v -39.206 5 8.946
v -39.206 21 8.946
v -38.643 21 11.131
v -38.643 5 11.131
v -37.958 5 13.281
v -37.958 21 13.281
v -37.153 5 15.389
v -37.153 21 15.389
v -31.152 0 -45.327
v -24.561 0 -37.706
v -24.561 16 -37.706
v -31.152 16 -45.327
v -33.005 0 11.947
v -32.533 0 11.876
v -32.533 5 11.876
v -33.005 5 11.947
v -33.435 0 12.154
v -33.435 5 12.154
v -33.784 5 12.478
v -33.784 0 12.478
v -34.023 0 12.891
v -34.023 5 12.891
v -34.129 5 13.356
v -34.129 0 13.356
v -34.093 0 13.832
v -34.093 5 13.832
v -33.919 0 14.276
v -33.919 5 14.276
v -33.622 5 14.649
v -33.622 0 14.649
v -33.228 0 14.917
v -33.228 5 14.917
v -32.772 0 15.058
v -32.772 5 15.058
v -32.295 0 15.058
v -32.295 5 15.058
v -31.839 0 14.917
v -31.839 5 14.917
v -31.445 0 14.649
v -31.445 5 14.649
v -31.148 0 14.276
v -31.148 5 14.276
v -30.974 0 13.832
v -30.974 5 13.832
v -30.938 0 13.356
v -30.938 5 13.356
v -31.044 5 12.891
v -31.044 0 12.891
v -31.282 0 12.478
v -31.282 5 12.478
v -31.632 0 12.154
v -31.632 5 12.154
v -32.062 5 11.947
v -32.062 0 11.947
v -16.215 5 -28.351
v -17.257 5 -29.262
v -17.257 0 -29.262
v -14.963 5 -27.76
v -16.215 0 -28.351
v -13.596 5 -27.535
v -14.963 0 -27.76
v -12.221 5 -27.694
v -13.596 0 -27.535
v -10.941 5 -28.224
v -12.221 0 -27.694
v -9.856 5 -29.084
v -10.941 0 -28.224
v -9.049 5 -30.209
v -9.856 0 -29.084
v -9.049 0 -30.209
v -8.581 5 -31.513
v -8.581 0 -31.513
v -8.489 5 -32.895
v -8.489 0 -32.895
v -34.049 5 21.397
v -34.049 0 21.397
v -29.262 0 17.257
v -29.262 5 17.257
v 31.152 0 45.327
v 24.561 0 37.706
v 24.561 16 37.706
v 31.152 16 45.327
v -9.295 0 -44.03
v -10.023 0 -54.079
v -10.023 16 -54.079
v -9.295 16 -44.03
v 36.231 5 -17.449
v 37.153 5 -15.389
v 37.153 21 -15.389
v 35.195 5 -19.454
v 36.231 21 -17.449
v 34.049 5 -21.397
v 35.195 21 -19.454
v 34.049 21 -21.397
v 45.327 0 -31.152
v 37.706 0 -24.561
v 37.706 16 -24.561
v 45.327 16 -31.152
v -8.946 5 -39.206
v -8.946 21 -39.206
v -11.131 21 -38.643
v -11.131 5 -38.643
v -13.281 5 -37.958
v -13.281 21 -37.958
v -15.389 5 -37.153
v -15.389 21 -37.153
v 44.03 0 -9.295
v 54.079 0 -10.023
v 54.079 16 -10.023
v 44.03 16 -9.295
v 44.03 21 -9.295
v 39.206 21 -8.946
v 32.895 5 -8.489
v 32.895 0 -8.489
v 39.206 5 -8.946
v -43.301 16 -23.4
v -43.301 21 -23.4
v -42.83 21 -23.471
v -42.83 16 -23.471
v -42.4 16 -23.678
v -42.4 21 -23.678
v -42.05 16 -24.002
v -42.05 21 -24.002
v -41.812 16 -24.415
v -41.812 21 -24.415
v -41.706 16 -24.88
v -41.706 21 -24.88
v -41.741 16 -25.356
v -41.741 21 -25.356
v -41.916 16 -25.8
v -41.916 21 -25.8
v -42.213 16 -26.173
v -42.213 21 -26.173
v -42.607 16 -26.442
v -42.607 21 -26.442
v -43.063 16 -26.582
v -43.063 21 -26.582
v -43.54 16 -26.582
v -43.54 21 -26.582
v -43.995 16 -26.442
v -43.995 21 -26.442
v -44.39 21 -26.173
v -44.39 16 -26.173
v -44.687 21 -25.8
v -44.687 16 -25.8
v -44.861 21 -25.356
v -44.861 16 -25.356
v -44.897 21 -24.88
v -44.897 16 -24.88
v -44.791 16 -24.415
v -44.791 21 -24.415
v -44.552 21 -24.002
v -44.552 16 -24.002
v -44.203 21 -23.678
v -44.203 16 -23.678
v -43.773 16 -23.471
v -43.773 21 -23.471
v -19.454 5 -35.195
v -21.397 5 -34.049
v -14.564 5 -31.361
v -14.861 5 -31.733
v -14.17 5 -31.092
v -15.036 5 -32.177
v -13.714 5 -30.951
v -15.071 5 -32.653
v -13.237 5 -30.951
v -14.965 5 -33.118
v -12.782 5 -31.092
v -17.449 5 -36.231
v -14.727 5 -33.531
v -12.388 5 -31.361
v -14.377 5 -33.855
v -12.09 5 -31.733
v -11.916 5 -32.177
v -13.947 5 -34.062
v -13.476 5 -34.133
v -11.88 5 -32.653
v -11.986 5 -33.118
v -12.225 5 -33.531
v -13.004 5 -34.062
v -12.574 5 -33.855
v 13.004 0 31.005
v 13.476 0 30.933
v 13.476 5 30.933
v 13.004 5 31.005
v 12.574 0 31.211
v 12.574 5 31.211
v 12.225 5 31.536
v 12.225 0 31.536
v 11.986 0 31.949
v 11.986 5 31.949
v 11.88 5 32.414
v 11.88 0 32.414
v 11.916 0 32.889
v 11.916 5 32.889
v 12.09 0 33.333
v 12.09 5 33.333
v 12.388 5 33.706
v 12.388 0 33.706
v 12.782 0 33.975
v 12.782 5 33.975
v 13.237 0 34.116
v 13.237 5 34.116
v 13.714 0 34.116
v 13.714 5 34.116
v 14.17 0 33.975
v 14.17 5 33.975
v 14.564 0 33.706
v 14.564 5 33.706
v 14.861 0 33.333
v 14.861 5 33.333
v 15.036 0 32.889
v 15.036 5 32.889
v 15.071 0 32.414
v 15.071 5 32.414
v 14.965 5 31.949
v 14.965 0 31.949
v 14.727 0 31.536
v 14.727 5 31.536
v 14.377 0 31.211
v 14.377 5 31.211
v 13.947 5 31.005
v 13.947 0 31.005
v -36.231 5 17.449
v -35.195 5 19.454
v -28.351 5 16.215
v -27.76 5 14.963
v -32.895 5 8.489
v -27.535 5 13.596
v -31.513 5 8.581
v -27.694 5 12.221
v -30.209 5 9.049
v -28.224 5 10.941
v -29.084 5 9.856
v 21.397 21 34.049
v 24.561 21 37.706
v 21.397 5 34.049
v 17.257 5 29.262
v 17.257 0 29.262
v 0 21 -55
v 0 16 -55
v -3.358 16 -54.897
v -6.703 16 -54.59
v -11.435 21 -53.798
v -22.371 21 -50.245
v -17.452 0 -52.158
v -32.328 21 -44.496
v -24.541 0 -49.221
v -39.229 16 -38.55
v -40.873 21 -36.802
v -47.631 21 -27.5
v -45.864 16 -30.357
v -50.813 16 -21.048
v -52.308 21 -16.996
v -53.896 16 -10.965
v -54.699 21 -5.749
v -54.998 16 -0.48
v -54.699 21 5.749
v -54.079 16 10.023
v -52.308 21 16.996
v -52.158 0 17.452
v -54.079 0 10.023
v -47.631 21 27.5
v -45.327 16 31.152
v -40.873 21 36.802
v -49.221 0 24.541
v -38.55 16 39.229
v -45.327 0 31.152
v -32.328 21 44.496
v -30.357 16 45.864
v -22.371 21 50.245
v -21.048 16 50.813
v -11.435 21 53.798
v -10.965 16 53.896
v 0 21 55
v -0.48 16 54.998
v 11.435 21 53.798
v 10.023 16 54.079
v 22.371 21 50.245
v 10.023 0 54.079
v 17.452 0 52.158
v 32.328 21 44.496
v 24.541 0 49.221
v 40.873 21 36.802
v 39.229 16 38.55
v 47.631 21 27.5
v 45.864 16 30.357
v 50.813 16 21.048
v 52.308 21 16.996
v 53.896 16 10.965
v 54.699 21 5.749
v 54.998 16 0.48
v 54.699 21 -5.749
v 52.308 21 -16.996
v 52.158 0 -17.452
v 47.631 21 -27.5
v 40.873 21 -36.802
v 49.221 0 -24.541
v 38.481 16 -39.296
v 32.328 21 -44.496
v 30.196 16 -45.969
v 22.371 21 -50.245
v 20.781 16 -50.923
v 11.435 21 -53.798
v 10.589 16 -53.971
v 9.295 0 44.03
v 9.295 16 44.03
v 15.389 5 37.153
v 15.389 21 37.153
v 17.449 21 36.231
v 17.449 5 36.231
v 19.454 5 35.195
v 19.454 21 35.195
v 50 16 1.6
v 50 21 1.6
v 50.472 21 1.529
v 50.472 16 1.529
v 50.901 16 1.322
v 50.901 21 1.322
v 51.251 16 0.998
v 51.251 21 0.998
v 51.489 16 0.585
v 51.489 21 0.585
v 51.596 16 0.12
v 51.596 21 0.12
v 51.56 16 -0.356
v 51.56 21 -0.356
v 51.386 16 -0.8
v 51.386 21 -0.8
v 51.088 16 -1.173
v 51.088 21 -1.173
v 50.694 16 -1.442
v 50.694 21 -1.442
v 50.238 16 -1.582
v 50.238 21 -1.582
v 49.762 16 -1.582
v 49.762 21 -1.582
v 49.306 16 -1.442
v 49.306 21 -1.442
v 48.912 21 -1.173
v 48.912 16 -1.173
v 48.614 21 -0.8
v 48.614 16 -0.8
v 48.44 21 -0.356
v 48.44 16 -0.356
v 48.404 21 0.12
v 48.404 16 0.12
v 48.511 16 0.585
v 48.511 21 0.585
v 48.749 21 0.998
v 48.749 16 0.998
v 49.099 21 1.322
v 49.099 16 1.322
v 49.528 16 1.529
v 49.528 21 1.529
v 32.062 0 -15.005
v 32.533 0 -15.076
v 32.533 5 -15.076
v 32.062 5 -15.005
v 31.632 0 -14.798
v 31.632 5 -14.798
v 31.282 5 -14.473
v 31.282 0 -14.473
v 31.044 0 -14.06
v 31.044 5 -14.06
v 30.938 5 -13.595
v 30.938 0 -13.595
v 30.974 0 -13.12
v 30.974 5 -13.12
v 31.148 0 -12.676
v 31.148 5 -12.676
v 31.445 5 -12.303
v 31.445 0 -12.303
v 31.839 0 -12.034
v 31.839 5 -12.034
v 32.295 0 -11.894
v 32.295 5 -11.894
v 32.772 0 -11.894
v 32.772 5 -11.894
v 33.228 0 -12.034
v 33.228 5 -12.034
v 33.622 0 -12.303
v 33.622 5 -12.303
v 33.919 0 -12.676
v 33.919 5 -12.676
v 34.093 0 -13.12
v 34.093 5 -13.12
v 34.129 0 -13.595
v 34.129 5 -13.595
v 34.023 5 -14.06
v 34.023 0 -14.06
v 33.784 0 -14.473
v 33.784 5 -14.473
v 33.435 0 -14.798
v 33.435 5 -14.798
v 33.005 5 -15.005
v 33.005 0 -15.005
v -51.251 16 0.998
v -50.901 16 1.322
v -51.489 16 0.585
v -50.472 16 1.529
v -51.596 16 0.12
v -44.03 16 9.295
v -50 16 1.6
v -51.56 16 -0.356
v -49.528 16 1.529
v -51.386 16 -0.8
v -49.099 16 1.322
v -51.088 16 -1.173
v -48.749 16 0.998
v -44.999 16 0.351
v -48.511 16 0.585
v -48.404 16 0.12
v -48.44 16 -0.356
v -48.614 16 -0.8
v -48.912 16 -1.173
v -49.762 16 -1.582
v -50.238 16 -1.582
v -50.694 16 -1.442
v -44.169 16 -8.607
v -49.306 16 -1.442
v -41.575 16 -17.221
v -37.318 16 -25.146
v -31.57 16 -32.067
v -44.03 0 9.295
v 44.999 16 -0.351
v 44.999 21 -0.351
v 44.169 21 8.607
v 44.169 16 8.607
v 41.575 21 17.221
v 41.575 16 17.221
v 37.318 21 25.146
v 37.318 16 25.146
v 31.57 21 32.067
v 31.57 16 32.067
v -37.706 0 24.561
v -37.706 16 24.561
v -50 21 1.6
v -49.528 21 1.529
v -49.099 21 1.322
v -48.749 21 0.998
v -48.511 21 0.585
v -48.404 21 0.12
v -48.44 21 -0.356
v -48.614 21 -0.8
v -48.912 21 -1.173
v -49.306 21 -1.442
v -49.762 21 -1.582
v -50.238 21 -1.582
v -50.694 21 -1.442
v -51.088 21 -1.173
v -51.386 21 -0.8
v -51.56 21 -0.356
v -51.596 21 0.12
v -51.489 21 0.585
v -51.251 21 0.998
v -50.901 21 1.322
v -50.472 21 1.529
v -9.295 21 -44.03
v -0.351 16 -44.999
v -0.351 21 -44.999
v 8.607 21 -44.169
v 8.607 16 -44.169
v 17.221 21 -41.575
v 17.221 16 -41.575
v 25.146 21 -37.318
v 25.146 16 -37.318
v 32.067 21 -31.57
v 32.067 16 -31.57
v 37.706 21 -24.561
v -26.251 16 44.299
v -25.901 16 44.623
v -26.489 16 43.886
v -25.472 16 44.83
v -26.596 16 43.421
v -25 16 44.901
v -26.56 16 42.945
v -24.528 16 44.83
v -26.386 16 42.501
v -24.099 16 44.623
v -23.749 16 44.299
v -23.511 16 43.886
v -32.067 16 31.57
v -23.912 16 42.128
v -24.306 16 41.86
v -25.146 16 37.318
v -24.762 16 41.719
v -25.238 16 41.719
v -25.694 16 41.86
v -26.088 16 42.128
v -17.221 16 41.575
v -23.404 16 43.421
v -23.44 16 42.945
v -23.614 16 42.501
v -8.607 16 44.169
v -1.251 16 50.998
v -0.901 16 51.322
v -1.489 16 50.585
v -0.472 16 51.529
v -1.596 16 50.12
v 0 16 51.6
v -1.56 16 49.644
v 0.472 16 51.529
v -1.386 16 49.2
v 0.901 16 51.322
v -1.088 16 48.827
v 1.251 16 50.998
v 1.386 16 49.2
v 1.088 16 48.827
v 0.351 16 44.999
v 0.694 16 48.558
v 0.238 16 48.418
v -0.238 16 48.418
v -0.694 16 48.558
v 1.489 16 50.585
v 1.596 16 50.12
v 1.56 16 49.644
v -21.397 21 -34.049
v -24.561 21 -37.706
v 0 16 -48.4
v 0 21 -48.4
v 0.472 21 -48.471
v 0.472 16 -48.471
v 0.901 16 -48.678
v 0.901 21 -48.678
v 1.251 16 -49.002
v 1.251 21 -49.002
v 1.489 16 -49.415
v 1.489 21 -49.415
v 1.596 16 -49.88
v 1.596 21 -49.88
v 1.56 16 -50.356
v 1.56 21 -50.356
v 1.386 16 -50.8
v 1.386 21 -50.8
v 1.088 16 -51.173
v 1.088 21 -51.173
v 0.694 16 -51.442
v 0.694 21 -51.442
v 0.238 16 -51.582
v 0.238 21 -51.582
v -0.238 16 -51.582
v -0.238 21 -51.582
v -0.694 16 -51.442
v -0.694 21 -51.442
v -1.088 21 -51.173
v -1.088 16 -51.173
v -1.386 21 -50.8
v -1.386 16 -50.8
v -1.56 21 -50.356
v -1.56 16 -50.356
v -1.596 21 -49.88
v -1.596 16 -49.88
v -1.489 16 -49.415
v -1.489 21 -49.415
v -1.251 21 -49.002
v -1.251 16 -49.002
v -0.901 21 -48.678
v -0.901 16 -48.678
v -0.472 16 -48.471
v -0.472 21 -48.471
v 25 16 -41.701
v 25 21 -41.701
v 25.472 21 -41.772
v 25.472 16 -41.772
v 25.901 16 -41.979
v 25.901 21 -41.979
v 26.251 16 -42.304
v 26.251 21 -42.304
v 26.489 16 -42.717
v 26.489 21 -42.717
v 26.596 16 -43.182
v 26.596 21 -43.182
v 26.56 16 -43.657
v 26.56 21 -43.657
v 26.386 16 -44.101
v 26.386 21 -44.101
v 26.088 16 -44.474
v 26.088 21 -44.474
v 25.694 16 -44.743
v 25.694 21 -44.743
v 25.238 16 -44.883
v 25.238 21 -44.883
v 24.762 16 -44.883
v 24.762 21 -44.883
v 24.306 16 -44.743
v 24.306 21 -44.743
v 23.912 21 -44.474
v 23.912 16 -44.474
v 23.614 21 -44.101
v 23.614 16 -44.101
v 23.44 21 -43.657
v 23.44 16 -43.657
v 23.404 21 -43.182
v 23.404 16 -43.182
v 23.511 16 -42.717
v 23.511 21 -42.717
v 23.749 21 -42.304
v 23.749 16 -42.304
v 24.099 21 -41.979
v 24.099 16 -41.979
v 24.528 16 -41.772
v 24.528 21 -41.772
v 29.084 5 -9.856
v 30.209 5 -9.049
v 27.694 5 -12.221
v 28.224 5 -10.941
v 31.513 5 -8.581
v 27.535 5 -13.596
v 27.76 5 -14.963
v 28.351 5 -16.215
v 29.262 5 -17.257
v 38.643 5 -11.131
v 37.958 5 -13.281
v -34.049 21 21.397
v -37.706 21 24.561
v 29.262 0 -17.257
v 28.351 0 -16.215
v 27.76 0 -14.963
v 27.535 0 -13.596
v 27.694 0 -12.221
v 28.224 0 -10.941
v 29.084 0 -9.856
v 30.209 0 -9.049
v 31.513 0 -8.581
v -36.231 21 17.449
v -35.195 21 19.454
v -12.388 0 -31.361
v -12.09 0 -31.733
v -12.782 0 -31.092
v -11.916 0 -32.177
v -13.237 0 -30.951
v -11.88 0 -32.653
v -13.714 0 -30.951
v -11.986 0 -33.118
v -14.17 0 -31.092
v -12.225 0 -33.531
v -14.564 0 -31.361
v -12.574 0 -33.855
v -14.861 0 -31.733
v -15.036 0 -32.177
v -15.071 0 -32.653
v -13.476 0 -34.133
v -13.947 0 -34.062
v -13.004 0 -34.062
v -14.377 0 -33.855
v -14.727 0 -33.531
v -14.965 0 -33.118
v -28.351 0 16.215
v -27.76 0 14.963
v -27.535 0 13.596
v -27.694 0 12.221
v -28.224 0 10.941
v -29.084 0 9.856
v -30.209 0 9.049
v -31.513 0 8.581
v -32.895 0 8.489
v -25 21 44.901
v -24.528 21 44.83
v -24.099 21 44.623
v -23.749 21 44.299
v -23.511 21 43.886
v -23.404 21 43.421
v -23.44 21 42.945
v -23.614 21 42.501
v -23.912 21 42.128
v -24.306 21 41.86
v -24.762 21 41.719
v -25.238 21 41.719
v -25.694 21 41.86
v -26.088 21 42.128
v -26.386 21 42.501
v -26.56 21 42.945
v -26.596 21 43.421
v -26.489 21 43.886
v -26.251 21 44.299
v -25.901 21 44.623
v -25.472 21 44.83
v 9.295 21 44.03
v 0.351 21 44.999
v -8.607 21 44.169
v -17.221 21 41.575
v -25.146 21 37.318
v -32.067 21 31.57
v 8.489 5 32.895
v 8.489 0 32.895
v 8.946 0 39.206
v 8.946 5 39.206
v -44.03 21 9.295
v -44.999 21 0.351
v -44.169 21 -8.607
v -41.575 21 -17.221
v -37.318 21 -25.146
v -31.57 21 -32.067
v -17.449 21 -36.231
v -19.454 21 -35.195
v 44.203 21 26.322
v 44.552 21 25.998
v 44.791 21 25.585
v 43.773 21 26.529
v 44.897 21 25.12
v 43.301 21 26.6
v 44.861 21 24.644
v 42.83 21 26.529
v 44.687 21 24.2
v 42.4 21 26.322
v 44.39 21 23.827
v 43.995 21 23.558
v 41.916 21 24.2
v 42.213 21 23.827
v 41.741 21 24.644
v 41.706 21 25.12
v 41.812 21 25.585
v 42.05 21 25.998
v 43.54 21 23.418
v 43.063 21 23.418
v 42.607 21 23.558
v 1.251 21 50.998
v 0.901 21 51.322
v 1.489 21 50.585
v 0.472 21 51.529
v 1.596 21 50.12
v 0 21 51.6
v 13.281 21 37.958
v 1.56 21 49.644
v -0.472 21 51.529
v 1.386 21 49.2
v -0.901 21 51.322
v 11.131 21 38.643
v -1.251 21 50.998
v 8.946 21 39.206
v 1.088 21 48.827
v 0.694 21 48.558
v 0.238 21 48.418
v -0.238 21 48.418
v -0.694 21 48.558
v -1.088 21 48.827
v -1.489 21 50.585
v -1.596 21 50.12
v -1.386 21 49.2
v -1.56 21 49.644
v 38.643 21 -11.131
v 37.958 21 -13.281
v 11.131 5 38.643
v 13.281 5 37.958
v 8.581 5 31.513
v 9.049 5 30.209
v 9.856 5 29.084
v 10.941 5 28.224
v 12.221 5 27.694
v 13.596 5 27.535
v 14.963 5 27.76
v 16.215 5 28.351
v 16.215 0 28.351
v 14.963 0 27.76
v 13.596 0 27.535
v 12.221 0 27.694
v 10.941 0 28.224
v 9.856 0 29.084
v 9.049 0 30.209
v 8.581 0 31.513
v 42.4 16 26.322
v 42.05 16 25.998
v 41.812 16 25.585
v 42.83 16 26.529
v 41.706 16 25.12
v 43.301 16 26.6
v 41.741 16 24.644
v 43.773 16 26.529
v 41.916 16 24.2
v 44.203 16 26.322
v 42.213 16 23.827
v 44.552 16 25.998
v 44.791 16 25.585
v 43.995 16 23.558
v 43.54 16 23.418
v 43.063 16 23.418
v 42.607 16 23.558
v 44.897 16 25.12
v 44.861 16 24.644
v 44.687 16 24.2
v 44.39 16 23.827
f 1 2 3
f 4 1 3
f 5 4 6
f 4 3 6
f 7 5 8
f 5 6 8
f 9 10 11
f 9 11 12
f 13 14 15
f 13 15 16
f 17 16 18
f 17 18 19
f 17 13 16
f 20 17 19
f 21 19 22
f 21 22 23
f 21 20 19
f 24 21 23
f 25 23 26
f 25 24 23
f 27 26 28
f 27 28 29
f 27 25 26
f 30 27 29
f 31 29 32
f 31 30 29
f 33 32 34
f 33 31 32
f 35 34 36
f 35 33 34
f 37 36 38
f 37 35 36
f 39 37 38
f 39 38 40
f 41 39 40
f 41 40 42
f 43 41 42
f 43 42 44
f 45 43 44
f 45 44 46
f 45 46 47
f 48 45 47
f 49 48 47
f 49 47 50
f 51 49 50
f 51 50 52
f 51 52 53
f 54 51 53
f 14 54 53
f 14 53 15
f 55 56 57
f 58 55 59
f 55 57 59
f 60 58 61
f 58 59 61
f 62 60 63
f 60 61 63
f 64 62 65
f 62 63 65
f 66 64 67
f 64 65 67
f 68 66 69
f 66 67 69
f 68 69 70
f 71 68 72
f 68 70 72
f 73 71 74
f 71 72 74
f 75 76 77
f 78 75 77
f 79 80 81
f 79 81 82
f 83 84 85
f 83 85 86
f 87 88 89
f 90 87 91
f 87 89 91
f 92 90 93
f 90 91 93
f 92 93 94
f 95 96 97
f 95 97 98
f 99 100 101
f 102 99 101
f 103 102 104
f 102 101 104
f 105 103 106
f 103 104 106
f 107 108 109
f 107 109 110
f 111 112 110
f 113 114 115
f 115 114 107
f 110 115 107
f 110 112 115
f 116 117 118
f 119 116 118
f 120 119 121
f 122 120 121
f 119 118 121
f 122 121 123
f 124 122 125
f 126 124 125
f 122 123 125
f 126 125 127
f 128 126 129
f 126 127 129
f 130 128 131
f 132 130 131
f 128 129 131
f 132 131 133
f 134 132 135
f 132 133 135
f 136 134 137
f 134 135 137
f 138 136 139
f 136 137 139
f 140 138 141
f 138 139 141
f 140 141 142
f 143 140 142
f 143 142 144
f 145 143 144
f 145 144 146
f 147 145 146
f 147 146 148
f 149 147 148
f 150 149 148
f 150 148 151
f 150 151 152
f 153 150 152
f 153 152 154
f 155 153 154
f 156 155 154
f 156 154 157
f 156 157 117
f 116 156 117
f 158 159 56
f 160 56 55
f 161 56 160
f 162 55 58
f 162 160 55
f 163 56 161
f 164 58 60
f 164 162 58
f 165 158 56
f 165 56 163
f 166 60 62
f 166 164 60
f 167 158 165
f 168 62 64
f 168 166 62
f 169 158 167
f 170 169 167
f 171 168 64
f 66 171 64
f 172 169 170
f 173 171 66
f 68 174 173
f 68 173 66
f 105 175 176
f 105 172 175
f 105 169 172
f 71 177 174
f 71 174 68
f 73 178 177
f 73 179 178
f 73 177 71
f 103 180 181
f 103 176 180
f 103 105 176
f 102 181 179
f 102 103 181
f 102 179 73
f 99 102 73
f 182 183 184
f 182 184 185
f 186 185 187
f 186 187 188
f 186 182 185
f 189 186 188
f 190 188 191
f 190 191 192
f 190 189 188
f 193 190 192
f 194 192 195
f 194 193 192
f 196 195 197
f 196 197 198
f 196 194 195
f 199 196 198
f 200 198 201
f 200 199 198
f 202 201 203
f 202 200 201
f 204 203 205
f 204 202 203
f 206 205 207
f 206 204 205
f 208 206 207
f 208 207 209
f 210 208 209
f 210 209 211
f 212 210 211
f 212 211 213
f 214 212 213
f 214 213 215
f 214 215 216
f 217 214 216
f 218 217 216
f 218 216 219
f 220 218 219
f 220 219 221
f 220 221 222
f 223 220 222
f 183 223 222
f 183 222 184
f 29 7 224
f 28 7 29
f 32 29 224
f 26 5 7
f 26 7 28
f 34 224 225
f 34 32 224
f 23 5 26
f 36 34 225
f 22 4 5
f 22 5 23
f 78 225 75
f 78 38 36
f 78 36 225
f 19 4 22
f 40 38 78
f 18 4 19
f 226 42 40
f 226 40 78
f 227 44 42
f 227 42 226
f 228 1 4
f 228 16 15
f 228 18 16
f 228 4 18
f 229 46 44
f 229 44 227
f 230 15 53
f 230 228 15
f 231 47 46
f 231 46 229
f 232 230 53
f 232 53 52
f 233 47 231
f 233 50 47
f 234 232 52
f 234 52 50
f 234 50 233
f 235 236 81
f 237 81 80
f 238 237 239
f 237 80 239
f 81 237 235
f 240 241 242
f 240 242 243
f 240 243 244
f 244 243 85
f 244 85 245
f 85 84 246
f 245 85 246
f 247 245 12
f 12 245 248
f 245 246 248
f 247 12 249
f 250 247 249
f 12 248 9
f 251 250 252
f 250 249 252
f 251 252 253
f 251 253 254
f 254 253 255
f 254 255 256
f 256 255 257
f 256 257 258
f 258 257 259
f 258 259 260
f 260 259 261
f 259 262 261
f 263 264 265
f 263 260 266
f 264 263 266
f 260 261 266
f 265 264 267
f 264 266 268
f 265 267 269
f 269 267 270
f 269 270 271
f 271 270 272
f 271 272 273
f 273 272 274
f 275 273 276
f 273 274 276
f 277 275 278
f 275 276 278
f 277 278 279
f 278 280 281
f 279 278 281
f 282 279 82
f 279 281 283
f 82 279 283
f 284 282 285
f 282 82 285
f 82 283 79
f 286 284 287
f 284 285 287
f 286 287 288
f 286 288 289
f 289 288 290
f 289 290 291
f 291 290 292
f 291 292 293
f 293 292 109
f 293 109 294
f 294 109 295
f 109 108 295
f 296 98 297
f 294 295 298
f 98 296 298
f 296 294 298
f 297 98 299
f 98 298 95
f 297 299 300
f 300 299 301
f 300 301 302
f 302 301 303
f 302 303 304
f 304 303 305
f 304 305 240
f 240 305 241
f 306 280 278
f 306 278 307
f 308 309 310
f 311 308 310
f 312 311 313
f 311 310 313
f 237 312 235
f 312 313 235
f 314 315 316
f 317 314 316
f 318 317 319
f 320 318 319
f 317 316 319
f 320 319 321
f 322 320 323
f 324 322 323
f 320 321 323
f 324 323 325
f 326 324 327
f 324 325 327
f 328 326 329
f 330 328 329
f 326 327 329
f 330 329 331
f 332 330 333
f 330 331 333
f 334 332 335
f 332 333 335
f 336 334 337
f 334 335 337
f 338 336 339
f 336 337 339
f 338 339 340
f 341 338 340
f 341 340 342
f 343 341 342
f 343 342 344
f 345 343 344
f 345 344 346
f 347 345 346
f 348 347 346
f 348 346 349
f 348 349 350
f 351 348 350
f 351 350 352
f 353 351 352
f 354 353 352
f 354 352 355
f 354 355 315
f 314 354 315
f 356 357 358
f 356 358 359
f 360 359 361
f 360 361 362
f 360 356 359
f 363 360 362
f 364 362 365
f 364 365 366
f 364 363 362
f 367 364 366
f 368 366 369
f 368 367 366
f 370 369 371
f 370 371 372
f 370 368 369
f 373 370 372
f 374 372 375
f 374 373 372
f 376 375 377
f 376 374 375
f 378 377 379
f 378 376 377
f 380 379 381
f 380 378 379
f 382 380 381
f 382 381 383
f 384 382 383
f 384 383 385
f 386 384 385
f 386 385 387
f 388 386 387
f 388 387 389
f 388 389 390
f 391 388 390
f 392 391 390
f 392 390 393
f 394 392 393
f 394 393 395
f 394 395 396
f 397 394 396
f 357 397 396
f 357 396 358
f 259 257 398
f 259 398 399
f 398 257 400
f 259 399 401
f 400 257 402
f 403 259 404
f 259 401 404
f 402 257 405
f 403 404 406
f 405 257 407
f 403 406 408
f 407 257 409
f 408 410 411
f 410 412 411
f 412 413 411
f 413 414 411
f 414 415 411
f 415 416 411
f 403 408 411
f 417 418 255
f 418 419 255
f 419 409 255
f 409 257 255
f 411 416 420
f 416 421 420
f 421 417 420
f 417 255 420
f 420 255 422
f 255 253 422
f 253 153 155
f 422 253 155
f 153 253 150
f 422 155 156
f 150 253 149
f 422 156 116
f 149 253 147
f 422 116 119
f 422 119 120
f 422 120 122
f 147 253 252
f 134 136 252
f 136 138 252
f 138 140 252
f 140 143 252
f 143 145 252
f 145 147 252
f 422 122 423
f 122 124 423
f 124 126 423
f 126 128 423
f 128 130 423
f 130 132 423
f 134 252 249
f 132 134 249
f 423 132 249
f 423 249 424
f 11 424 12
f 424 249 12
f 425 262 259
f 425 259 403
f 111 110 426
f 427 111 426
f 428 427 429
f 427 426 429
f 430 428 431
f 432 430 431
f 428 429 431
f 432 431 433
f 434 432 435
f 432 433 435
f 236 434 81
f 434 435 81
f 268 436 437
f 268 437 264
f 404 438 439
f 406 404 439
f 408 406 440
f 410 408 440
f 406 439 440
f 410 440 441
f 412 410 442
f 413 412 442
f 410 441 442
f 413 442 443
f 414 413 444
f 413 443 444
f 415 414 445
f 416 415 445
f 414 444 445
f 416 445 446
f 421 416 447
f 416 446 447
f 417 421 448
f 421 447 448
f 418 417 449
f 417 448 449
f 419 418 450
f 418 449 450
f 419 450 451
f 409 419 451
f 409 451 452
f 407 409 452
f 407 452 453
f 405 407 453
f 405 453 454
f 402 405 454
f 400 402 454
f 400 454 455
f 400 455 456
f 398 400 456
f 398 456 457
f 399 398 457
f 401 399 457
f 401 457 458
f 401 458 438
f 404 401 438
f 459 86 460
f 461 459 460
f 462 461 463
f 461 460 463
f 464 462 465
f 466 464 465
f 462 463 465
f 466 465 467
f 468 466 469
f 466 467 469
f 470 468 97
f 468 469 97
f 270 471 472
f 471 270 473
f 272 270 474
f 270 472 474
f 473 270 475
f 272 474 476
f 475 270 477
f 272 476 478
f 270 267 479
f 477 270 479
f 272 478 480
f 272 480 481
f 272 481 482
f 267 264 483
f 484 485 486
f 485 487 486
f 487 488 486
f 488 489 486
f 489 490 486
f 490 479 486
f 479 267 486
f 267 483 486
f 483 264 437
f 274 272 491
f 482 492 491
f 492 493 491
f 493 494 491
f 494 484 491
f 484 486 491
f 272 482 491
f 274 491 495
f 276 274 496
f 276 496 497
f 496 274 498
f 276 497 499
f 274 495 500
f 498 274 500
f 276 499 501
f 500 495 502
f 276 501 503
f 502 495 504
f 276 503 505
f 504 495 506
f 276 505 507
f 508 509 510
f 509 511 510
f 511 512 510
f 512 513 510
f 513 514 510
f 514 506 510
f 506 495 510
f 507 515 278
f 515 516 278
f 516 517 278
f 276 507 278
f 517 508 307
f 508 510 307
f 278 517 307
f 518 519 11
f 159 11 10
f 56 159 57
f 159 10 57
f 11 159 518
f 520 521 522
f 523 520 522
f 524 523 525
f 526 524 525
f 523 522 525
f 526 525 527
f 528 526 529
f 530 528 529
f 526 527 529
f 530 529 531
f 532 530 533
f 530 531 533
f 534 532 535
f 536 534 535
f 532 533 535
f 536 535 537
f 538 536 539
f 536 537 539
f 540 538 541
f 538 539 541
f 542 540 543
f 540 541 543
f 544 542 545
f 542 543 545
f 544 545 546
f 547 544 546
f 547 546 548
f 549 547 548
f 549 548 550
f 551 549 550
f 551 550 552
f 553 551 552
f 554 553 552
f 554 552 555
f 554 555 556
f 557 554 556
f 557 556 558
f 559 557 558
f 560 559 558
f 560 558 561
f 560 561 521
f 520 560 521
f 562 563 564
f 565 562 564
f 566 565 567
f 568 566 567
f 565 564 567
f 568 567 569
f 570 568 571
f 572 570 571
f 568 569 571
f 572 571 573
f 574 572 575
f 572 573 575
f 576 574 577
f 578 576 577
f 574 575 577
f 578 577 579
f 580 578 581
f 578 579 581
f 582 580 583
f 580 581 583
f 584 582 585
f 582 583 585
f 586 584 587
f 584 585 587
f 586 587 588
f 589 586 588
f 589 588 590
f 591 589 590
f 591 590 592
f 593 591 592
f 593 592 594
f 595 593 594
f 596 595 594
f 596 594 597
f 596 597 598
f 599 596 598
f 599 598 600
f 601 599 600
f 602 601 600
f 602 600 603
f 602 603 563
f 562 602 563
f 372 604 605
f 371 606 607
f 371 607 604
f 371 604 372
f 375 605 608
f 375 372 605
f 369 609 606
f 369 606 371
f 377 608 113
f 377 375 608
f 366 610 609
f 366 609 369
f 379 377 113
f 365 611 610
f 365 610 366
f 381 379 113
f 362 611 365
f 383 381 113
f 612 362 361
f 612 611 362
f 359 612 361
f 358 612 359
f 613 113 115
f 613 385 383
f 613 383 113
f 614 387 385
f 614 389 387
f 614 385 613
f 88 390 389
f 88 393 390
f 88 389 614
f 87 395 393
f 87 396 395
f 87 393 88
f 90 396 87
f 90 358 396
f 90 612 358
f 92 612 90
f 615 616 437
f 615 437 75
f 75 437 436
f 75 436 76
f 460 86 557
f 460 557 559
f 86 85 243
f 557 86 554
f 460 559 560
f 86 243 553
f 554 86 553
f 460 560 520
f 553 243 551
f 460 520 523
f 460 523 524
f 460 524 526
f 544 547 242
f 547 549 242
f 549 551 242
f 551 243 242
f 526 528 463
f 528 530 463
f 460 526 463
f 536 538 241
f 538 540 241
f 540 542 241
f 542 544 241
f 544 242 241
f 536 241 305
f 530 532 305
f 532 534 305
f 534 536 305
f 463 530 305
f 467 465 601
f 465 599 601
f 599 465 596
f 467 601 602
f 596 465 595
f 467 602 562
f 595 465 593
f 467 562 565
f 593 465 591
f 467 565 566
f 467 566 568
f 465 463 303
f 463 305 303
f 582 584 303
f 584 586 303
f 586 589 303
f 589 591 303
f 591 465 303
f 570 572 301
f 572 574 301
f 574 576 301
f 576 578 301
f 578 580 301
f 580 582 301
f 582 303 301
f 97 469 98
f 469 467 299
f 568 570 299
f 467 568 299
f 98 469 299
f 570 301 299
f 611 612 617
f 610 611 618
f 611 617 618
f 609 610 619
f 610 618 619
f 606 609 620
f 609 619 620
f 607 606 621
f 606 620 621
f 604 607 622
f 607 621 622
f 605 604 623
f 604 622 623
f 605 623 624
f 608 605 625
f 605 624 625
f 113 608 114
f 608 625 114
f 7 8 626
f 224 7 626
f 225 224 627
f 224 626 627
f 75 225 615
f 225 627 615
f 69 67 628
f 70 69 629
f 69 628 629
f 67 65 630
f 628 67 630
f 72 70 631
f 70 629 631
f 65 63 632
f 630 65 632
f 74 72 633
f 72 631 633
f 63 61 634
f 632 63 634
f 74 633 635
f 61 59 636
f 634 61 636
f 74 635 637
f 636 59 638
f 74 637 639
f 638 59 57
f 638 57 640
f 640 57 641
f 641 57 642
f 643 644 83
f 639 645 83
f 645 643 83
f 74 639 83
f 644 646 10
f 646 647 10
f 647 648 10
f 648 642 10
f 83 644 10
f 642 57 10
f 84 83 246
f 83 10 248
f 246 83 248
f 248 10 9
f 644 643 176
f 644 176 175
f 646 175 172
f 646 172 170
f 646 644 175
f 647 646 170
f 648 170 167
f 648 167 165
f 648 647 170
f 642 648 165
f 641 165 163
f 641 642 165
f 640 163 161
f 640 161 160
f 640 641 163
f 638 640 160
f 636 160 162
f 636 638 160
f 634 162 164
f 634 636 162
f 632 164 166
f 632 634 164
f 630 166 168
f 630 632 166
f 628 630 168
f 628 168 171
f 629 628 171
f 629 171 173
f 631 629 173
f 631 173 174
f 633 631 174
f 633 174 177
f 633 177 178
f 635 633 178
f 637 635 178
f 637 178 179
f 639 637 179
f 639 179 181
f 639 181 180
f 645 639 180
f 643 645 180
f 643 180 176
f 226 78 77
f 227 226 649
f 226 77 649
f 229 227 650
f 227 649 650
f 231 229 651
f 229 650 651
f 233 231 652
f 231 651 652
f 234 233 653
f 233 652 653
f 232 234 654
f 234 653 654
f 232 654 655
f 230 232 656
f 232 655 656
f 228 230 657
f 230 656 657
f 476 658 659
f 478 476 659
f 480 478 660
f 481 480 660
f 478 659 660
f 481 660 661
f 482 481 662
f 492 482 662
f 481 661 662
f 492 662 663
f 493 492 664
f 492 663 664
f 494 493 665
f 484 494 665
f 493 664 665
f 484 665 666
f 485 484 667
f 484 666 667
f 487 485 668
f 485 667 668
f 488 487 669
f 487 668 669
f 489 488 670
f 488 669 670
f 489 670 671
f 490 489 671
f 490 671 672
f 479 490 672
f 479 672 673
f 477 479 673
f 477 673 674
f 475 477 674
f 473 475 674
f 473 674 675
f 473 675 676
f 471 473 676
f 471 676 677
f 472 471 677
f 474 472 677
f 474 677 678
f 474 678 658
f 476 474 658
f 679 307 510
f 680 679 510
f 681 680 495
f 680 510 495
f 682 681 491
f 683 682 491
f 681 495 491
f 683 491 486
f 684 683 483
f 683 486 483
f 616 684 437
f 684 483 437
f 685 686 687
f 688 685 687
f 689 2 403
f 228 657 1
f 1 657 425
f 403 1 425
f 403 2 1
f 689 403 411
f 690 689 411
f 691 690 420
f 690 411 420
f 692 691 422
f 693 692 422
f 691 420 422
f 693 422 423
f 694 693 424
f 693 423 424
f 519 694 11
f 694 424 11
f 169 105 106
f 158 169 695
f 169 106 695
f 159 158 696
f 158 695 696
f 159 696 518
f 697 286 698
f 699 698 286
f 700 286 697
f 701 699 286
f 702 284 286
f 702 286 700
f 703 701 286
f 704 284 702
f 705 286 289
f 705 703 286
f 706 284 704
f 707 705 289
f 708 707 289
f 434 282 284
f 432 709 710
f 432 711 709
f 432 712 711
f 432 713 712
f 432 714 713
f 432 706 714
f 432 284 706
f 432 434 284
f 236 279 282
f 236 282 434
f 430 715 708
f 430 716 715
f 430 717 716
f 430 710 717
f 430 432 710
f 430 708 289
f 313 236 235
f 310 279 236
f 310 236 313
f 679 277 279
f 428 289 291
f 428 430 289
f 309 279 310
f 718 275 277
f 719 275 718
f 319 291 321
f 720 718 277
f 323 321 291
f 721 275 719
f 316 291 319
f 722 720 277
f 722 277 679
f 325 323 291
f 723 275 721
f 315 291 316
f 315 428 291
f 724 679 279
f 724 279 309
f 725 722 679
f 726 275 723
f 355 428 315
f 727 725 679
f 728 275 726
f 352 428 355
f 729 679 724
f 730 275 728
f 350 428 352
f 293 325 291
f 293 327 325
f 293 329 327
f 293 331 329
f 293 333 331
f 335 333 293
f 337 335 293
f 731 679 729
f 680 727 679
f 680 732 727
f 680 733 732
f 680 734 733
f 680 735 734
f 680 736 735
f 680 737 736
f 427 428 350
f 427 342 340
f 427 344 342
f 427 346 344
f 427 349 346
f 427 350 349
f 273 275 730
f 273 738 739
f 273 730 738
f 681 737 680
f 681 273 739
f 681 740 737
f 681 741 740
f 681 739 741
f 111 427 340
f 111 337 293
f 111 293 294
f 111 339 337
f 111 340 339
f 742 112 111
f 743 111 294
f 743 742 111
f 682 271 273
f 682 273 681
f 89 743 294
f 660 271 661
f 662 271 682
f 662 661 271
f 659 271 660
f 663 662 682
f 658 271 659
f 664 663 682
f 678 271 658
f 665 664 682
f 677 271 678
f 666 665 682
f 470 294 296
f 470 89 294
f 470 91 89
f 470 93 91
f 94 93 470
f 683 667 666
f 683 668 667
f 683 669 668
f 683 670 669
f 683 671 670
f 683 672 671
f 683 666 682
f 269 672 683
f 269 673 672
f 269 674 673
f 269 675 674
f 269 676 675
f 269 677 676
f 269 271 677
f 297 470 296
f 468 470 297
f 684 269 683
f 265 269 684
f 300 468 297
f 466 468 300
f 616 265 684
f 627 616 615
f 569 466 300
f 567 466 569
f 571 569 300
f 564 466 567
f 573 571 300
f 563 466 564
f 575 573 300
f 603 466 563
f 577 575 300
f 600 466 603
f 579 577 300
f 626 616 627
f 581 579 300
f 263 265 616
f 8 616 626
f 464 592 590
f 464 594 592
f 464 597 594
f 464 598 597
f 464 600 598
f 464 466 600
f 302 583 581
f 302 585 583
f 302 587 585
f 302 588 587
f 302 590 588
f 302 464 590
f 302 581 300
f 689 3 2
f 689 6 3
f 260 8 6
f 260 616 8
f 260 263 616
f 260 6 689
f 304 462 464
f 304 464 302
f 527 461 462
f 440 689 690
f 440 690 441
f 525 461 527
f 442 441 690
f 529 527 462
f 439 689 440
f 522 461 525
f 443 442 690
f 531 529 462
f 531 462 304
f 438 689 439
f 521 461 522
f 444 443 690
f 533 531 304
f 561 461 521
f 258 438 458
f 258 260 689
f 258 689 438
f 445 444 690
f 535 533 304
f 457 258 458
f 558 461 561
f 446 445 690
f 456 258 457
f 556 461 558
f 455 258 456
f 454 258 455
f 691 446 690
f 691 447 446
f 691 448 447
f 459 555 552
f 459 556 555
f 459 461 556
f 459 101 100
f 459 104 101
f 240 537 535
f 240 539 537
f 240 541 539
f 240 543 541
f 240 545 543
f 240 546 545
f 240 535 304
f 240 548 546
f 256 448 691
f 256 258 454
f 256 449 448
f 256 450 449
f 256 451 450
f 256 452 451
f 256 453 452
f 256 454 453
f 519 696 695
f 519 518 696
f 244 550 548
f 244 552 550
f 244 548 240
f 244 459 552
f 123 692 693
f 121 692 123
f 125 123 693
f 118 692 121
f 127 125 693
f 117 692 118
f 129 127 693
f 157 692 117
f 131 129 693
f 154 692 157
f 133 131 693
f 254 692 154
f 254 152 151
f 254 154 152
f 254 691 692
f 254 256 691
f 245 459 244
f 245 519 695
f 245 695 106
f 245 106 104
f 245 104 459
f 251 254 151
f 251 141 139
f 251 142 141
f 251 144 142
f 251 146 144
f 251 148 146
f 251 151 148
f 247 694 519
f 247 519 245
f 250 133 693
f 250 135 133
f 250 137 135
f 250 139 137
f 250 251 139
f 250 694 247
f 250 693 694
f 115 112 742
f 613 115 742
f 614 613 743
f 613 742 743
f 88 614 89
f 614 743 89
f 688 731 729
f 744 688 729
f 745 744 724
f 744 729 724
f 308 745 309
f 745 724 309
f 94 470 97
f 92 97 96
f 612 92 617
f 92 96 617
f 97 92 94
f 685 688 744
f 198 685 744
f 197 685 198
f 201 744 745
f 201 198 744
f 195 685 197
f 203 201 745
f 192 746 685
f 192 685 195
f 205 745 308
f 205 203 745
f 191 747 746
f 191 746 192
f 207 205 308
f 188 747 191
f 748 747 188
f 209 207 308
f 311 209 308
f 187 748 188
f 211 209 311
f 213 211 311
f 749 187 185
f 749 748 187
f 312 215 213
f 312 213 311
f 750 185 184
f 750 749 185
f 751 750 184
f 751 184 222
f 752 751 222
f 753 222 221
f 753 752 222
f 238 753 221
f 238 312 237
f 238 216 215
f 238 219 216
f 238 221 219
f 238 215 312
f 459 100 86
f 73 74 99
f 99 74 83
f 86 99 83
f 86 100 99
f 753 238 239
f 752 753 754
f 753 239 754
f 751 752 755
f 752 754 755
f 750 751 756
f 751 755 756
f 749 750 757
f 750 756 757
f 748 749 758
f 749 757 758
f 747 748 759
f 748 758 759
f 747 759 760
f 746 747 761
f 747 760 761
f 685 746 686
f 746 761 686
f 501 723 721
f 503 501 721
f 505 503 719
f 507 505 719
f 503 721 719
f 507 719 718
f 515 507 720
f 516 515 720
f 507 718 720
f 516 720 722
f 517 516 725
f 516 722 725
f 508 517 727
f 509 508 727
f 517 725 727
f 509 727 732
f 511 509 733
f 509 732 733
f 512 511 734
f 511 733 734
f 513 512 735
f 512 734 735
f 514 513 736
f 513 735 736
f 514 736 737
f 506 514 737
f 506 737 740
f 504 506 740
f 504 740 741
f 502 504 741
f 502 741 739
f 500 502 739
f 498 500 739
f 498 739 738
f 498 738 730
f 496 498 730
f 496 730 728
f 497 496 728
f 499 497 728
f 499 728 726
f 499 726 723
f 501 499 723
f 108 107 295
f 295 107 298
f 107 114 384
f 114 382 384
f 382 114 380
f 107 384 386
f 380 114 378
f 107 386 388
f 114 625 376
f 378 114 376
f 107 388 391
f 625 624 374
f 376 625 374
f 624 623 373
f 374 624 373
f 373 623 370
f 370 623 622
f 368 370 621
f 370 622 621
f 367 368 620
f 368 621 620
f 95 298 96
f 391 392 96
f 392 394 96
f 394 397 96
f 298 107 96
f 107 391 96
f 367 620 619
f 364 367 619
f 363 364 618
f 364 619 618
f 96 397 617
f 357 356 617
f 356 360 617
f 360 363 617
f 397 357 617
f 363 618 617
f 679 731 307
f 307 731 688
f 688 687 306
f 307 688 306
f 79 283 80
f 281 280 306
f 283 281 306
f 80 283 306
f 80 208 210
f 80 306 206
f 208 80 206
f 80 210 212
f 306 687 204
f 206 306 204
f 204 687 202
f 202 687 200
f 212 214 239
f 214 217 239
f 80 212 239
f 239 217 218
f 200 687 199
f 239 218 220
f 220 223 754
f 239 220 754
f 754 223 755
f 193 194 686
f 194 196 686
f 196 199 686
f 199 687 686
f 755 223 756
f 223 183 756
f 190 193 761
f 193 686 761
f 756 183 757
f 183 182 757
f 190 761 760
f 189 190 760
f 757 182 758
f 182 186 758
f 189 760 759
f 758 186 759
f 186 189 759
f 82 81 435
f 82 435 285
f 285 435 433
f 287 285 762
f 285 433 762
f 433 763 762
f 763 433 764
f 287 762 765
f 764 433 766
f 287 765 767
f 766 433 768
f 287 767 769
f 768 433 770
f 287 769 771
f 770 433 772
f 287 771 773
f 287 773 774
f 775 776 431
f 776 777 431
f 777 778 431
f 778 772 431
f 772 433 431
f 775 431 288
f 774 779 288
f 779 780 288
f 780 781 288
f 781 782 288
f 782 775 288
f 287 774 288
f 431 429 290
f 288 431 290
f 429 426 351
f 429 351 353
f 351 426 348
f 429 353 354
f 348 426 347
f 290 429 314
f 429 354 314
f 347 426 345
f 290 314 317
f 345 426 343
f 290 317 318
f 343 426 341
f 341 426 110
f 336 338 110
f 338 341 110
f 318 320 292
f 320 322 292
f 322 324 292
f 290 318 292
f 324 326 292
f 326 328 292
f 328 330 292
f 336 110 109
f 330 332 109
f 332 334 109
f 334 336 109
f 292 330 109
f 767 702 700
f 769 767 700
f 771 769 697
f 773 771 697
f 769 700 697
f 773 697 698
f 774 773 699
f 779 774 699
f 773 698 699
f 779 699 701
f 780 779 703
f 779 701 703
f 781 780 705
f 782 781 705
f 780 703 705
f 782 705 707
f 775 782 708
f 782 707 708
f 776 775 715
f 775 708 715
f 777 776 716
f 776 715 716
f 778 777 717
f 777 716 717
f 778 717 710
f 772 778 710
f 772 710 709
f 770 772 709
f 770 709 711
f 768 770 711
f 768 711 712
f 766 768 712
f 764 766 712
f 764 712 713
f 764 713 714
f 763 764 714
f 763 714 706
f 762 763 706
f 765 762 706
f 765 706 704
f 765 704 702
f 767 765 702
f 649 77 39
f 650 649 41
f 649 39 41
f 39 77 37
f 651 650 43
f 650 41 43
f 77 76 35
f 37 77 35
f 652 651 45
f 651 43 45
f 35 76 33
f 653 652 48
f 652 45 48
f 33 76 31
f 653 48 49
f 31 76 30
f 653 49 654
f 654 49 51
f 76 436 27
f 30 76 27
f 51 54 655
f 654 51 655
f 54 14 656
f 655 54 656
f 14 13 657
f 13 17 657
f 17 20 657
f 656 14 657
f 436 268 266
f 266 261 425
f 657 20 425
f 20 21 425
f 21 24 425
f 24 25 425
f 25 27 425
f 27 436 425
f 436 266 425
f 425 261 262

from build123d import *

# Parameters (mm, degrees)
SKETCH1_R           = 55
SKETCH1_R_2         = 1.6
BOSS_EXTRUDE8_DEPTH = 21
CUT_EXTRUDE1_DEPTH  = 16
CUT_EXTRUDE7_START  = 21
SKETCH1_22_R        = 5
SKETCH1_22_R_2      = 1.6
CUT_EXTRUDE7_DEPTH  = 16
SKETCH6_R           = 1.6
CUT_EXTRUDE8_DEPTH  = 81.566742518


with BuildPart() as part:
    # Sketch1 → Boss-Extrude8 (new body)
    with BuildSketch(Plane(origin=(0, 0, 0), x_dir=(1, 0, 0), z_dir=(0, 1, 0))):
        with Locations(Location((0, 0, 0), (0, 0, 90))):
            Circle(SKETCH1_R)
        with BuildLine():
            Line((-24.560877041, 37.706276918), (-17.257446053, 29.262481604))
            ThreePointArc((-17.257446053, 29.262481604), (-11.562365731, 27.91402016), (-8.488842047, 32.894556307))
            Line((-8.488842047, 32.894556307), (-9.295201395, 44.029526809))
            ThreePointArc((-9.295201395, 44.029526809), (17.220754456, 41.574578963), (37.706276918, 24.560877041))
            Line((37.706276918, 24.560877041), (29.262481604, 17.257446053))
            ThreePointArc((29.262481604, 17.257446053), (27.91402016, 11.562365731), (32.894556307, 8.488842047))
            Line((32.894556307, 8.488842047), (44.029526809, 9.295201395))
            ThreePointArc((44.029526809, 9.295201395), (41.574578963, -17.220754456), (24.560877041, -37.706276918))
            Line((24.560877041, -37.706276918), (17.257446053, -29.262481604))
            ThreePointArc((17.257446053, -29.262481604), (11.562365731, -27.91402016), (8.488842047, -32.894556307))
            Line((8.488842047, -32.894556307), (8.94591471, -39.206246783))
            Line((8.94591471, -39.206246783), (9.295201395, -44.029526809))
            ThreePointArc((9.295201395, -44.029526809), (-17.220754456, -41.574578963), (-37.706276918, -24.560877041))
            Line((-37.706276918, -24.560877041), (-34.04871992, -21.39728601))
            Line((-34.04871992, -21.39728601), (-29.262481604, -17.257446053))
            ThreePointArc((-29.262481604, -17.257446053), (-27.91402016, -11.562365731), (-32.894556307, -8.488842047))
            Line((-32.894556307, -8.488842047), (-44.029526809, -9.295201395))
            ThreePointArc((-44.029526809, -9.295201395), (-41.574578963, 17.220754456), (-24.560877041, 37.706276918))
        make_face(mode=Mode.SUBTRACT)
        with Locations(Location((-13.475782892, 32.533417823, 0), (0, 0, 90))):
            Circle(SKETCH1_R_2, mode=Mode.SUBTRACT)
        with Locations(Location((32.533417823, 13.475782892, 0), (0, 0, 90))):
            Circle(SKETCH1_R_2, mode=Mode.SUBTRACT)
        with Locations(Location((-32.533417823, -13.475782892, 0), (0, 0, 90))):
            Circle(SKETCH1_R_2, mode=Mode.SUBTRACT)
        with Locations(Location((13.475782892, -32.533417823, 0), (0, 0, 90))):
            Circle(SKETCH1_R_2, mode=Mode.SUBTRACT)
    extrude(amount=BOSS_EXTRUDE8_DEPTH)

    # Sketch1_15 → Cut-Extrude1 (cut)
    with BuildSketch(Plane(origin=(0, 0, 0), x_dir=(1, 0, 0), z_dir=(0, 1, 0))):
        with BuildLine():
            ThreePointArc((-9.295201395, 44.029526809), (17.220754456, 41.574578963), (37.706276918, 24.560877041))
            Line((37.706276918, 24.560877041), (45.326940374, 31.152343031))
            ThreePointArc((45.326940374, 31.152343031), (21.04758878, 50.813374288), (-10.022953902, 54.079019916))
            Line((-10.022953902, 54.079019916), (-9.295201395, 44.029526809))
        make_face()
        with BuildLine():
            ThreePointArc((-44.029526809, -9.295201395), (-41.574578963, 17.220754456), (-24.560877041, 37.706276918))
            Line((-24.560877041, 37.706276918), (-31.152343031, 45.326940374))
            ThreePointArc((-31.152343031, 45.326940374), (-50.813374288, 21.04758878), (-54.079019916, -10.022953902))
            Line((-54.079019916, -10.022953902), (-44.029526809, -9.295201395))
        make_face()
        with BuildLine():
            Line((54.079019916, 10.022953902), (44.029526809, 9.295201395))
            ThreePointArc((44.029526809, 9.295201395), (41.574578963, -17.220754456), (24.560877041, -37.706276918))
            Line((24.560877041, -37.706276918), (31.152343031, -45.326940374))
            ThreePointArc((31.152343031, -45.326940374), (50.813374288, -21.04758878), (54.079019916, 10.022953902))
        make_face()
        with BuildLine():
            ThreePointArc((9.295201395, -44.029526809), (-17.220754456, -41.574578963), (-37.706276918, -24.560877041))
            Line((-37.706276918, -24.560877041), (-45.326940374, -31.152343031))
            ThreePointArc((-45.326940374, -31.152343031), (-21.04758878, -50.813374288), (10.022953902, -54.079019916))
            Line((10.022953902, -54.079019916), (9.295201395, -44.029526809))
        make_face()
    extrude(amount=CUT_EXTRUDE1_DEPTH, mode=Mode.SUBTRACT)

    # Sketch1_22 → Cut-Extrude7 (cut)
    with BuildSketch(Plane(origin=(0, 0, 0), x_dir=(1, 0, 0), z_dir=(0, 1, 0)).offset(CUT_EXTRUDE7_START)):
        with Locations((13.475782892, -32.533417823)):
            Circle(SKETCH1_22_R)
        with Locations(Location((13.475782892, -32.533417823, 0), (0, 0, 90))):
            Circle(SKETCH1_22_R_2, mode=Mode.SUBTRACT)
        with BuildLine():
            ThreePointArc((15.389200056, -37.152815484), (18.458608875, -35.727285584), (21.39728601, -34.04871992))
            Line((21.39728601, -34.04871992), (17.257446053, -29.262481604))
            ThreePointArc((17.257446053, -29.262481604), (18.16130932, -30.788183712), (18.475782892, -32.533417823))
            ThreePointArc((18.475782892, -32.533417823), (17.633130954, -35.311268987), (15.389200056, -37.152815484))
        make_face()
        with BuildLine():
            ThreePointArc((8.94591471, -39.206246783), (12.210798405, -38.315213416), (15.389200056, -37.152815484))
            ThreePointArc((15.389200056, -37.152815484), (10.849982107, -36.788434889), (8.488842047, -32.894556307))
            Line((8.488842047, -32.894556307), (8.94591471, -39.206246783))
        make_face()
        with BuildLine():
            ThreePointArc((39.206246783, 8.94591471), (38.315213416, 12.210798403), (37.152815486, 15.389200052))
            ThreePointArc((37.152815486, 15.389200052), (37.437344225, 14.451234501), (37.533417823, 13.475782892))
            ThreePointArc((37.533417823, 13.475782892), (36.194407608, 10.070323483), (32.894556307, 8.488842047))
            Line((32.894556307, 8.488842047), (39.206246783, 8.94591471))
        make_face()
        with Locations((32.533417823, 13.475782892)):
            Circle(SKETCH1_22_R)
        with Locations(Location((32.533417823, 13.475782892, 0), (0, 0, 90))):
            Circle(SKETCH1_22_R_2, mode=Mode.SUBTRACT)
        with BuildLine():
            ThreePointArc((37.152815486, 15.389200052), (35.727285585, 18.458608873), (34.04871992, 21.39728601))
            Line((34.04871992, 21.39728601), (29.262481604, 17.257446053))
            ThreePointArc((29.262481604, 17.257446053), (33.685447704, 18.341255855), (37.152815486, 15.389200052))
        make_face()
        with BuildLine():
            Line((-8.488842047, 32.894556307), (-8.94591471, 39.206246783))
            ThreePointArc((-8.94591471, 39.206246783), (-12.210798505, 38.315213384), (-15.38920025, 37.152815404))
            ThreePointArc((-15.38920025, 37.152815404), (-10.849982197, 36.788434944), (-8.488842047, 32.894556307))
        make_face()
        with BuildLine():
            ThreePointArc((-17.257446053, 29.262481604), (-18.34125588, 33.685447599), (-15.38920025, 37.152815404))
            ThreePointArc((-15.38920025, 37.152815404), (-18.458608968, 35.727285536), (-21.39728601, 34.04871992))
            Line((-21.39728601, 34.04871992), (-17.257446053, 29.262481604))
        make_face()
        with Locations((-13.475782892, 32.533417823)):
            Circle(SKETCH1_22_R)
        with Locations(Location((-13.475782892, 32.533417823, 0), (0, 0, 90))):
            Circle(SKETCH1_22_R_2, mode=Mode.SUBTRACT)
        with Locations((-32.533417823, -13.475782892)):
            Circle(SKETCH1_22_R)
        with Locations(Location((-32.533417823, -13.475782892, 0), (0, 0, 90))):
            Circle(SKETCH1_22_R_2, mode=Mode.SUBTRACT)
        with BuildLine():
            ThreePointArc((-29.262481604, -17.257446053), (-33.685447701, -18.341255856), (-37.152815484, -15.389200057))
            ThreePointArc((-37.152815484, -15.389200057), (-35.727285584, -18.458608875), (-34.04871992, -21.39728601))
            Line((-34.04871992, -21.39728601), (-29.262481604, -17.257446053))
        make_face()
        with BuildLine():
            Line((-32.894556307, -8.488842047), (-39.206246783, -8.94591471))
            ThreePointArc((-39.206246783, -8.94591471), (-38.315213416, -12.210798405), (-37.152815484, -15.389200057))
            ThreePointArc((-37.152815484, -15.389200057), (-36.788434889, -10.849982108), (-32.894556307, -8.488842047))
        make_face()
    extrude(amount=-CUT_EXTRUDE7_DEPTH, mode=Mode.SUBTRACT)

    # Sketch6 → Cut-Extrude8 (cut, through all)
    with BuildSketch(Plane(origin=(0, 21, 0), x_dir=(1, 0, 0), z_dir=(0, 1, 0))):
        with Locations(Location((0, 50, 0), (0, 0, 270))):
            Circle(SKETCH6_R)
        with Locations(Location((25, 43.301270189, 0), (0, 0, 270))):
            Circle(SKETCH6_R)
        with Locations(Location((50, 0, 0), (0, 0, 270))):
            Circle(SKETCH6_R)
        with Locations(Location((43.301270189, -25, 0), (0, 0, 270))):
            Circle(SKETCH6_R)
        with Locations(Location((0, -50, 0), (0, 0, 270))):
            Circle(SKETCH6_R)
        with Locations(Location((-25, -43.301270189, 0), (0, 0, 270))):
            Circle(SKETCH6_R)
        with Locations(Location((-50, 0, 0), (0, 0, 270))):
            Circle(SKETCH6_R)
        with Locations(Location((-43.301270189, 25, 0), (0, 0, 270))):
            Circle(SKETCH6_R)
    extrude(amount=-CUT_EXTRUDE8_DEPTH, mode=Mode.SUBTRACT)


solid = part.part
